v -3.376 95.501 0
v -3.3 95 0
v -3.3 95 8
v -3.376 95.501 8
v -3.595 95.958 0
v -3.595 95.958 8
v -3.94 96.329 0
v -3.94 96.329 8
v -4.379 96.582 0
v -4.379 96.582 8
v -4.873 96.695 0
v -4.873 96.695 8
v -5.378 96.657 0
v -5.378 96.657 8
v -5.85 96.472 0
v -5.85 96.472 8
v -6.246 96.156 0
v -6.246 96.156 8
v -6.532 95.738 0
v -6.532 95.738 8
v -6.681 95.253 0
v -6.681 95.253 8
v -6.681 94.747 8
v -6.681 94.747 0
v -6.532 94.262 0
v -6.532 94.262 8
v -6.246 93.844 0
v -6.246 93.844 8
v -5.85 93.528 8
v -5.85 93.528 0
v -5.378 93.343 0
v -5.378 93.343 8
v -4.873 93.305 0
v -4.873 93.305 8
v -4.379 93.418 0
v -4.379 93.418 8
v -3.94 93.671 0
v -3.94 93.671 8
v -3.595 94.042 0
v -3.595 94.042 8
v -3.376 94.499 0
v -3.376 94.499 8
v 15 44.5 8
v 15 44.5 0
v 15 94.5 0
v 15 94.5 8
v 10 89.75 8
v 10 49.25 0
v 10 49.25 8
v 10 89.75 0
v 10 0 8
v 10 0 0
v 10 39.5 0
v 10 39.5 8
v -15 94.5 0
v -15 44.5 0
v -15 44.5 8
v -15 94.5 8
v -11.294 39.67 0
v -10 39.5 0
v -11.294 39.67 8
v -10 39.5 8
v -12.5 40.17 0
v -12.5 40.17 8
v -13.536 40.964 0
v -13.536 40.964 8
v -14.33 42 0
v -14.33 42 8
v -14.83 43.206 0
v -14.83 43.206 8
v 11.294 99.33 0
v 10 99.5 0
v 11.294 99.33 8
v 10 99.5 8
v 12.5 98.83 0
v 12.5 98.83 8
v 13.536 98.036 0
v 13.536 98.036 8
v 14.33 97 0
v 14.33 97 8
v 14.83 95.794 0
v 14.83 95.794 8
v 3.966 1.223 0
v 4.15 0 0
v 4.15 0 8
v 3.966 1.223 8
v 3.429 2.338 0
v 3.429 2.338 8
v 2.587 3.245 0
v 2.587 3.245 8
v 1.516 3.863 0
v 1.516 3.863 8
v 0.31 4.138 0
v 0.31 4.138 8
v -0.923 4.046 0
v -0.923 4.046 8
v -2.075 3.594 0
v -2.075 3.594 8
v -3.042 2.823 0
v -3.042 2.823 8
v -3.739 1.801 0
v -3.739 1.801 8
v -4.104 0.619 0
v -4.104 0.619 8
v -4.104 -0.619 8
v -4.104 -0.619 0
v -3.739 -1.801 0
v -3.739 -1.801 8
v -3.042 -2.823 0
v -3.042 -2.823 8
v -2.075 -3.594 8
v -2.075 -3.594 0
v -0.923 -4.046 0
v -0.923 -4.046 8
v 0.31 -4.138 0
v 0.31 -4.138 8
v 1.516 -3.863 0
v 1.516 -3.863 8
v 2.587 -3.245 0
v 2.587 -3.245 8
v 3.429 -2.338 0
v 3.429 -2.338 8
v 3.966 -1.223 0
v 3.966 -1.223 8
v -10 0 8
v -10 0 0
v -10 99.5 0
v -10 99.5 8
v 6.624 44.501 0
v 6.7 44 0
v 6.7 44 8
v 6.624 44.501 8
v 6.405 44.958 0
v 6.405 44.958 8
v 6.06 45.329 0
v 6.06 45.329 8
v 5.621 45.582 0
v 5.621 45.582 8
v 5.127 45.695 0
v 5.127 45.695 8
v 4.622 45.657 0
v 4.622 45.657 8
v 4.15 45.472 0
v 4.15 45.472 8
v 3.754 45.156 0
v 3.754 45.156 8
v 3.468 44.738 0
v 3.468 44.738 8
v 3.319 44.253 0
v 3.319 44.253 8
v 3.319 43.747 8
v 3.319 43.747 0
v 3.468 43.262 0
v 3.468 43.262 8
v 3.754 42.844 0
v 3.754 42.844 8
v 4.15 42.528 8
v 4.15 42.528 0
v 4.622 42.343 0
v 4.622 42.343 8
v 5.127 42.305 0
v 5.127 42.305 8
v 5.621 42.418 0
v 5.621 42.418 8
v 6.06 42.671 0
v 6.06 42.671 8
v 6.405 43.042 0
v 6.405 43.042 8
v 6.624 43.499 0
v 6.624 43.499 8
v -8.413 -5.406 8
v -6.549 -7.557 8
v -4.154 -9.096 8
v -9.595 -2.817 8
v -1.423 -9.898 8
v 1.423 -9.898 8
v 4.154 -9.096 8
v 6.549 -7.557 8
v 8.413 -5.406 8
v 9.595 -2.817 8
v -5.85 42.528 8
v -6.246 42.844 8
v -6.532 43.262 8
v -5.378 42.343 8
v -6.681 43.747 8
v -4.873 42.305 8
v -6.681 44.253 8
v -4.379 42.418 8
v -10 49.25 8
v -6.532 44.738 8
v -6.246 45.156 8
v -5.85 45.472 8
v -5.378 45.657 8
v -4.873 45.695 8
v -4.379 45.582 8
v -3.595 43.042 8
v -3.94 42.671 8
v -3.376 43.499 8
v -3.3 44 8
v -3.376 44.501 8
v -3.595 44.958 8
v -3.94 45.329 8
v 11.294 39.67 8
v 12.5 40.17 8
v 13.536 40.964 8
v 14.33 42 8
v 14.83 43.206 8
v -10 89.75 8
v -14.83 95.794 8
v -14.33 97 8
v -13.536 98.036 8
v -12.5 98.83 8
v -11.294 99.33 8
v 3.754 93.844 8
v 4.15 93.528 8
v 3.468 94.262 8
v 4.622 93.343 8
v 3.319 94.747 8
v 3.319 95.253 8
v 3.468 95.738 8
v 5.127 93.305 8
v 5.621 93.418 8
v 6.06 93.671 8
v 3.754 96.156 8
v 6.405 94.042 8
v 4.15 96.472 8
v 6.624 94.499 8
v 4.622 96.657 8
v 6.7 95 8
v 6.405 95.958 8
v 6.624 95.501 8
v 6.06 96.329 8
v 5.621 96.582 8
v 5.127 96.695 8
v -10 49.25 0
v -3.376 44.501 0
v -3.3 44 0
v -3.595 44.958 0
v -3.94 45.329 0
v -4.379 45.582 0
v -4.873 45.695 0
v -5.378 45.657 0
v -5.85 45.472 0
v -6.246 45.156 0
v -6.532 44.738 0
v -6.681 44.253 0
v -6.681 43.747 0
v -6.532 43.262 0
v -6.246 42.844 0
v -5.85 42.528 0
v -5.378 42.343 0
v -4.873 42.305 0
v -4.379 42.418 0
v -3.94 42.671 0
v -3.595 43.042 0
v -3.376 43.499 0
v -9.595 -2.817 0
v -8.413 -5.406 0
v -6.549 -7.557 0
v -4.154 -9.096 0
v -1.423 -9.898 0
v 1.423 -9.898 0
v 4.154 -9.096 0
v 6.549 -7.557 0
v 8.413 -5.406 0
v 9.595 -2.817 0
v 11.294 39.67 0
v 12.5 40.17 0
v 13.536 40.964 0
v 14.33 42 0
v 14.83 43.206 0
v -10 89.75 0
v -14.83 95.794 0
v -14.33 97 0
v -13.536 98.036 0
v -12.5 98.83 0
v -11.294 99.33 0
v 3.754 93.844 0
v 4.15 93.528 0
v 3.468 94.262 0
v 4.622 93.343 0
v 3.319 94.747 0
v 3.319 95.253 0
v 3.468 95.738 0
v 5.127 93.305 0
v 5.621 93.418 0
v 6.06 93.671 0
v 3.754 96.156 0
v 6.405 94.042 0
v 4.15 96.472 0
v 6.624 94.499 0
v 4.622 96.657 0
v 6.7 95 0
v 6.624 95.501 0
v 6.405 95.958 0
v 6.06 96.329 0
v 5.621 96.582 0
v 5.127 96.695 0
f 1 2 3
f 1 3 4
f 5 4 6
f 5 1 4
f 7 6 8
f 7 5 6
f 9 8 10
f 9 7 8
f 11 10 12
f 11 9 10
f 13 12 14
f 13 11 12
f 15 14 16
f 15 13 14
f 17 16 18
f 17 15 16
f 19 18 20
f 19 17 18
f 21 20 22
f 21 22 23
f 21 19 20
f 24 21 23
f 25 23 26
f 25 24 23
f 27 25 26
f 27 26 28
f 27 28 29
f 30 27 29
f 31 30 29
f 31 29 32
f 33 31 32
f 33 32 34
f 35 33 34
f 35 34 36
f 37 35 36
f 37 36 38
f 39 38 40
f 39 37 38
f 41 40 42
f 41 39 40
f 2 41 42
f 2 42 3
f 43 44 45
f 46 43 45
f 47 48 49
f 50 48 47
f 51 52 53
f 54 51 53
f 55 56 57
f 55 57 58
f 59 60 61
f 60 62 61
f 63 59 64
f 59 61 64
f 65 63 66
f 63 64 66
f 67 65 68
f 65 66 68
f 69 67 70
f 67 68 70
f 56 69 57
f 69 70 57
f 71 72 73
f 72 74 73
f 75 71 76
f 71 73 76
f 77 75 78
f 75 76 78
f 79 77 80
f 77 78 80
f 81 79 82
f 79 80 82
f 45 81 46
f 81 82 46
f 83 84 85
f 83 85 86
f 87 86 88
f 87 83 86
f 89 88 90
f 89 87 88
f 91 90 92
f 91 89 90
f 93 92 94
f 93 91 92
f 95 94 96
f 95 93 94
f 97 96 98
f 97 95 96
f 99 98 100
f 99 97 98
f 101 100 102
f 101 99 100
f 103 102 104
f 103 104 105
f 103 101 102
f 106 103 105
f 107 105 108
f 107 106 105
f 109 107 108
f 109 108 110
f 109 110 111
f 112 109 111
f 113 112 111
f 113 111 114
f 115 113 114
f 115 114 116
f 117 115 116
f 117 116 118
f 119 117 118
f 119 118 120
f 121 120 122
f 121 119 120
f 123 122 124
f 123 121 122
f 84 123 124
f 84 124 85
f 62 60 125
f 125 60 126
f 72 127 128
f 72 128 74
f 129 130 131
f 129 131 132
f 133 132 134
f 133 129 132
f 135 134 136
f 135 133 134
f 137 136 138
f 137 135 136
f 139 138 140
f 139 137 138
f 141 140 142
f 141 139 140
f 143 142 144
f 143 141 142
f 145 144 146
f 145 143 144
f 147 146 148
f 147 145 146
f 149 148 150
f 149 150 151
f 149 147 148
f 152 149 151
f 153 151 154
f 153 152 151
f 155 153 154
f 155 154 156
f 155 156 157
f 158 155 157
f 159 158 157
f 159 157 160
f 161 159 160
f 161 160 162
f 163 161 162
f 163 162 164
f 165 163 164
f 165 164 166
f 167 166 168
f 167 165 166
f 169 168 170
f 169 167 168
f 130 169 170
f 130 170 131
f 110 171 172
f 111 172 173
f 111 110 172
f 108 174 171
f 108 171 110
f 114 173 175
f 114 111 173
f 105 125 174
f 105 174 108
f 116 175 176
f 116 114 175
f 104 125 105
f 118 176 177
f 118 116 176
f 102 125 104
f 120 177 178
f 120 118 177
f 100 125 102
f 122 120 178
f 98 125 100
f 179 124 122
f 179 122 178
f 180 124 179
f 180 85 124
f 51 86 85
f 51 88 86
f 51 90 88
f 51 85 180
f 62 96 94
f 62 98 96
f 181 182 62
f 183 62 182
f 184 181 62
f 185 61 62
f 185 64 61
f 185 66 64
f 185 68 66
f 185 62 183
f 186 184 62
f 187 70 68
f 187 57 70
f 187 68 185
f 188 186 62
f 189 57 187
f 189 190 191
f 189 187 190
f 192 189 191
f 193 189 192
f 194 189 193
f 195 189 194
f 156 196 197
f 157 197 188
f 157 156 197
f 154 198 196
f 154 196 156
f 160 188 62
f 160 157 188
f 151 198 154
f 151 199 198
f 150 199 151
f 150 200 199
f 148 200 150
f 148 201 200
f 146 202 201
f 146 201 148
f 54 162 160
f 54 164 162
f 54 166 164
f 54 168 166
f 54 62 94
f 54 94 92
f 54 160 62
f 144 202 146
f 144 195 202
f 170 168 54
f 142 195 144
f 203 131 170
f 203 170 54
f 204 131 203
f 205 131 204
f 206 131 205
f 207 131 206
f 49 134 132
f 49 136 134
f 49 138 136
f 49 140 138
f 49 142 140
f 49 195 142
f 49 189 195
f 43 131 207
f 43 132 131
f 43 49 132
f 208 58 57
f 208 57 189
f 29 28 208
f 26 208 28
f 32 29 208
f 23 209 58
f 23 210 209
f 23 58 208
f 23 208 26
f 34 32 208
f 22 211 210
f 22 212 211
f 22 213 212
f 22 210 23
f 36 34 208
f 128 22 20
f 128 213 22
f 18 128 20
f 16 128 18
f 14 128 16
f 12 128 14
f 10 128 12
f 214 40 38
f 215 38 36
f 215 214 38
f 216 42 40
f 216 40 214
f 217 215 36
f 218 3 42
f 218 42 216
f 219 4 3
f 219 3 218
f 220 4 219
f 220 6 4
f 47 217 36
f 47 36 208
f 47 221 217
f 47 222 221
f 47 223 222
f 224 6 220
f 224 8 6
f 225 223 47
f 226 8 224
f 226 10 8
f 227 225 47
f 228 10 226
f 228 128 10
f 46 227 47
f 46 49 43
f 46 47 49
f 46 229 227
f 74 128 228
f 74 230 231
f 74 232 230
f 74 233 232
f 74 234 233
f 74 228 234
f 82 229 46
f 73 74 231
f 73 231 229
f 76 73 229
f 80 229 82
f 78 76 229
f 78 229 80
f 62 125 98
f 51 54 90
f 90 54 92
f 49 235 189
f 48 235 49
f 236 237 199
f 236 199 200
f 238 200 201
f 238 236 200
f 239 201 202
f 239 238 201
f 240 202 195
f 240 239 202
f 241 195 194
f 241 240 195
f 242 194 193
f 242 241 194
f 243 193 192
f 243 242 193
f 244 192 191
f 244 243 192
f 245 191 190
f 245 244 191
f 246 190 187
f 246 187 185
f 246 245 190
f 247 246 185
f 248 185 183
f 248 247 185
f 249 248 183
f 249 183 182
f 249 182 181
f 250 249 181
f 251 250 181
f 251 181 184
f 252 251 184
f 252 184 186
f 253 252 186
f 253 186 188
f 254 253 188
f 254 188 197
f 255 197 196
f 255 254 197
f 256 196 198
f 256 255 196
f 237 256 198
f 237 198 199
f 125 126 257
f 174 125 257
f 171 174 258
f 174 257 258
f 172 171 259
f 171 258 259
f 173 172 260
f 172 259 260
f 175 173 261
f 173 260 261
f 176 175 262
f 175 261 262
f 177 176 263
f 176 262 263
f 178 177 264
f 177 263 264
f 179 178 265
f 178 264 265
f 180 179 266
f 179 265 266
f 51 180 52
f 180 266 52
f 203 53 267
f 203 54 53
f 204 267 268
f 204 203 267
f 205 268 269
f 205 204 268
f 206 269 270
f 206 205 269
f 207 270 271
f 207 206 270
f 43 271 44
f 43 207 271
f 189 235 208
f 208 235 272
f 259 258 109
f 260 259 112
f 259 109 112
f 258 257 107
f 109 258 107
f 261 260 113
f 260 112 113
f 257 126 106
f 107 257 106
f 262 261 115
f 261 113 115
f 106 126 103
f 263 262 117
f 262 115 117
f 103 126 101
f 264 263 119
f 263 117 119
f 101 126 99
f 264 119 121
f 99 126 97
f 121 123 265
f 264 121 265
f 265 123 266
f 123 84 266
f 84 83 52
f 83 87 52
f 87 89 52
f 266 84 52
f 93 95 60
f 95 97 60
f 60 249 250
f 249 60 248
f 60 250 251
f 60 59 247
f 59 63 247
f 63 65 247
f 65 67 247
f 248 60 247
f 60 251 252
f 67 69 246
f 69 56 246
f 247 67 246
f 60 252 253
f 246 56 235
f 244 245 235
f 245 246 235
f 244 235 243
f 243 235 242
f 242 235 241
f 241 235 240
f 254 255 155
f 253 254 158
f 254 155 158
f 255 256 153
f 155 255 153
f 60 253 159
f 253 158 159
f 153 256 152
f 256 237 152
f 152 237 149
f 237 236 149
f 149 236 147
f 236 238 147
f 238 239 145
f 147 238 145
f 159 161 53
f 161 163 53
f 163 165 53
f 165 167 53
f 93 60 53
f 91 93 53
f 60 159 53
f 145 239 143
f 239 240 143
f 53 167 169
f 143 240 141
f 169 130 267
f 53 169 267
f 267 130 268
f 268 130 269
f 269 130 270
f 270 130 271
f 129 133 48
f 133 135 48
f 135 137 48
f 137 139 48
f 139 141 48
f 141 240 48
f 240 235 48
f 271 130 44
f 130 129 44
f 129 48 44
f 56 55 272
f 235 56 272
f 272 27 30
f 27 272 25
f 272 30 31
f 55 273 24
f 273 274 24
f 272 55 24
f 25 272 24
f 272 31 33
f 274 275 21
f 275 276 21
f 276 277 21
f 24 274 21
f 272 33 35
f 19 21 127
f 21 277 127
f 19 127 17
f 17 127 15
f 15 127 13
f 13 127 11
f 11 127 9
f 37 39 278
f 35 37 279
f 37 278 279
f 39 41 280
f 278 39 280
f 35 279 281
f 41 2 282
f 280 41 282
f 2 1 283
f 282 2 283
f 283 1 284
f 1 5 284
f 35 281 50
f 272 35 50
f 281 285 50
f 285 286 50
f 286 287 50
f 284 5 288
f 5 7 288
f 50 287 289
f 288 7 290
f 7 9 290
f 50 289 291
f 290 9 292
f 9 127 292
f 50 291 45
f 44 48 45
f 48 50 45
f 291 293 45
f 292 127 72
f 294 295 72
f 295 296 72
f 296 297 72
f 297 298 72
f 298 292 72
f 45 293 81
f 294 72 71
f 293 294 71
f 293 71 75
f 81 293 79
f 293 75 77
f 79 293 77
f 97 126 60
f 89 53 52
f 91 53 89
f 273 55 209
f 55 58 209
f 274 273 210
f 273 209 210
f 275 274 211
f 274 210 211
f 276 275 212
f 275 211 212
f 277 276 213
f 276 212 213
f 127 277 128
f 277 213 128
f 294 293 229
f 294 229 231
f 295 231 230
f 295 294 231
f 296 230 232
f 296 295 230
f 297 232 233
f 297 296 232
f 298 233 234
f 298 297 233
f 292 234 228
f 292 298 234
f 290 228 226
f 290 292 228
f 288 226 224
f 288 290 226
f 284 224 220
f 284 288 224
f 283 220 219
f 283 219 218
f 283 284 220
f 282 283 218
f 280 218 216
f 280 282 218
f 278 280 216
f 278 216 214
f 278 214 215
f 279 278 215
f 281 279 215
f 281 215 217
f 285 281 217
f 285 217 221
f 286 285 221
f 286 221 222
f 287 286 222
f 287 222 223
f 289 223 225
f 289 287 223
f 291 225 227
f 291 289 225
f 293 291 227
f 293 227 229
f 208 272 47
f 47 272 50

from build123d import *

# Parameters (mm, degrees)
SKETCH_1_W      = 30
SKETCH_1_H      = 60
SKETCH_1_R      = 1.7
SKETCH_1_W_2    = 20
SKETCH_1_H_2    = 40.5
SKETCH_1_R_2    = 10
SKETCH_1_R_3    = 4.15
EXTRUDE_1_DEPTH = 8
FILLET_1_R      = 5


with BuildPart() as part:
    # Эскиз1 → Бобышка-Вытянуть1 (new body)
    # profile 1 of 3: a face of its own
    with BuildSketch(Plane.XY):
        with Locations((0, 69.5)):
            Rectangle(SKETCH_1_W, SKETCH_1_H)
        with Locations((-5, 44)):
            Circle(SKETCH_1_R, mode=Mode.SUBTRACT)
        with Locations((5, 95)):
            Circle(SKETCH_1_R, mode=Mode.SUBTRACT)
        with Locations((-5, 95)):
            Circle(SKETCH_1_R, mode=Mode.SUBTRACT)
        with Locations((5, 44)):
            Circle(SKETCH_1_R, mode=Mode.SUBTRACT)
        with Locations((0, 69.5)):
            Rectangle(SKETCH_1_W_2, SKETCH_1_H_2, mode=Mode.SUBTRACT)
    # profile 2 of 3: a face of its own
    with BuildSketch(Plane.XY):
        Circle(SKETCH_1_R_2)
        Circle(SKETCH_1_R_3, mode=Mode.SUBTRACT)
    # profile 3 of 3: a face of its own
    with BuildSketch(Plane.XY):
        with BuildLine():
            Line((-10, 39.5), (-10, 0))
            ThreePointArc((-10, 0), (0, 10), (10, 0))
            Line((10, 0), (10, 39.5))
            Line((10, 39.5), (-10, 39.5))
        make_face()
    extrude(amount=EXTRUDE_1_DEPTH)

    # Скругление1
    fillet_1_edges = [part.edges().sort_by_distance(p)[0] for p in [
        (15, 39.5, 4),
        (-15, 39.5, 4),
        (-15, 99.5, 4),
        (15, 99.5, 4),
    ]]
    fillet(fillet_1_edges, radius=FILLET_1_R - 0.0001)  # a hair under: the kernel refuses the full size


solid = part.part
